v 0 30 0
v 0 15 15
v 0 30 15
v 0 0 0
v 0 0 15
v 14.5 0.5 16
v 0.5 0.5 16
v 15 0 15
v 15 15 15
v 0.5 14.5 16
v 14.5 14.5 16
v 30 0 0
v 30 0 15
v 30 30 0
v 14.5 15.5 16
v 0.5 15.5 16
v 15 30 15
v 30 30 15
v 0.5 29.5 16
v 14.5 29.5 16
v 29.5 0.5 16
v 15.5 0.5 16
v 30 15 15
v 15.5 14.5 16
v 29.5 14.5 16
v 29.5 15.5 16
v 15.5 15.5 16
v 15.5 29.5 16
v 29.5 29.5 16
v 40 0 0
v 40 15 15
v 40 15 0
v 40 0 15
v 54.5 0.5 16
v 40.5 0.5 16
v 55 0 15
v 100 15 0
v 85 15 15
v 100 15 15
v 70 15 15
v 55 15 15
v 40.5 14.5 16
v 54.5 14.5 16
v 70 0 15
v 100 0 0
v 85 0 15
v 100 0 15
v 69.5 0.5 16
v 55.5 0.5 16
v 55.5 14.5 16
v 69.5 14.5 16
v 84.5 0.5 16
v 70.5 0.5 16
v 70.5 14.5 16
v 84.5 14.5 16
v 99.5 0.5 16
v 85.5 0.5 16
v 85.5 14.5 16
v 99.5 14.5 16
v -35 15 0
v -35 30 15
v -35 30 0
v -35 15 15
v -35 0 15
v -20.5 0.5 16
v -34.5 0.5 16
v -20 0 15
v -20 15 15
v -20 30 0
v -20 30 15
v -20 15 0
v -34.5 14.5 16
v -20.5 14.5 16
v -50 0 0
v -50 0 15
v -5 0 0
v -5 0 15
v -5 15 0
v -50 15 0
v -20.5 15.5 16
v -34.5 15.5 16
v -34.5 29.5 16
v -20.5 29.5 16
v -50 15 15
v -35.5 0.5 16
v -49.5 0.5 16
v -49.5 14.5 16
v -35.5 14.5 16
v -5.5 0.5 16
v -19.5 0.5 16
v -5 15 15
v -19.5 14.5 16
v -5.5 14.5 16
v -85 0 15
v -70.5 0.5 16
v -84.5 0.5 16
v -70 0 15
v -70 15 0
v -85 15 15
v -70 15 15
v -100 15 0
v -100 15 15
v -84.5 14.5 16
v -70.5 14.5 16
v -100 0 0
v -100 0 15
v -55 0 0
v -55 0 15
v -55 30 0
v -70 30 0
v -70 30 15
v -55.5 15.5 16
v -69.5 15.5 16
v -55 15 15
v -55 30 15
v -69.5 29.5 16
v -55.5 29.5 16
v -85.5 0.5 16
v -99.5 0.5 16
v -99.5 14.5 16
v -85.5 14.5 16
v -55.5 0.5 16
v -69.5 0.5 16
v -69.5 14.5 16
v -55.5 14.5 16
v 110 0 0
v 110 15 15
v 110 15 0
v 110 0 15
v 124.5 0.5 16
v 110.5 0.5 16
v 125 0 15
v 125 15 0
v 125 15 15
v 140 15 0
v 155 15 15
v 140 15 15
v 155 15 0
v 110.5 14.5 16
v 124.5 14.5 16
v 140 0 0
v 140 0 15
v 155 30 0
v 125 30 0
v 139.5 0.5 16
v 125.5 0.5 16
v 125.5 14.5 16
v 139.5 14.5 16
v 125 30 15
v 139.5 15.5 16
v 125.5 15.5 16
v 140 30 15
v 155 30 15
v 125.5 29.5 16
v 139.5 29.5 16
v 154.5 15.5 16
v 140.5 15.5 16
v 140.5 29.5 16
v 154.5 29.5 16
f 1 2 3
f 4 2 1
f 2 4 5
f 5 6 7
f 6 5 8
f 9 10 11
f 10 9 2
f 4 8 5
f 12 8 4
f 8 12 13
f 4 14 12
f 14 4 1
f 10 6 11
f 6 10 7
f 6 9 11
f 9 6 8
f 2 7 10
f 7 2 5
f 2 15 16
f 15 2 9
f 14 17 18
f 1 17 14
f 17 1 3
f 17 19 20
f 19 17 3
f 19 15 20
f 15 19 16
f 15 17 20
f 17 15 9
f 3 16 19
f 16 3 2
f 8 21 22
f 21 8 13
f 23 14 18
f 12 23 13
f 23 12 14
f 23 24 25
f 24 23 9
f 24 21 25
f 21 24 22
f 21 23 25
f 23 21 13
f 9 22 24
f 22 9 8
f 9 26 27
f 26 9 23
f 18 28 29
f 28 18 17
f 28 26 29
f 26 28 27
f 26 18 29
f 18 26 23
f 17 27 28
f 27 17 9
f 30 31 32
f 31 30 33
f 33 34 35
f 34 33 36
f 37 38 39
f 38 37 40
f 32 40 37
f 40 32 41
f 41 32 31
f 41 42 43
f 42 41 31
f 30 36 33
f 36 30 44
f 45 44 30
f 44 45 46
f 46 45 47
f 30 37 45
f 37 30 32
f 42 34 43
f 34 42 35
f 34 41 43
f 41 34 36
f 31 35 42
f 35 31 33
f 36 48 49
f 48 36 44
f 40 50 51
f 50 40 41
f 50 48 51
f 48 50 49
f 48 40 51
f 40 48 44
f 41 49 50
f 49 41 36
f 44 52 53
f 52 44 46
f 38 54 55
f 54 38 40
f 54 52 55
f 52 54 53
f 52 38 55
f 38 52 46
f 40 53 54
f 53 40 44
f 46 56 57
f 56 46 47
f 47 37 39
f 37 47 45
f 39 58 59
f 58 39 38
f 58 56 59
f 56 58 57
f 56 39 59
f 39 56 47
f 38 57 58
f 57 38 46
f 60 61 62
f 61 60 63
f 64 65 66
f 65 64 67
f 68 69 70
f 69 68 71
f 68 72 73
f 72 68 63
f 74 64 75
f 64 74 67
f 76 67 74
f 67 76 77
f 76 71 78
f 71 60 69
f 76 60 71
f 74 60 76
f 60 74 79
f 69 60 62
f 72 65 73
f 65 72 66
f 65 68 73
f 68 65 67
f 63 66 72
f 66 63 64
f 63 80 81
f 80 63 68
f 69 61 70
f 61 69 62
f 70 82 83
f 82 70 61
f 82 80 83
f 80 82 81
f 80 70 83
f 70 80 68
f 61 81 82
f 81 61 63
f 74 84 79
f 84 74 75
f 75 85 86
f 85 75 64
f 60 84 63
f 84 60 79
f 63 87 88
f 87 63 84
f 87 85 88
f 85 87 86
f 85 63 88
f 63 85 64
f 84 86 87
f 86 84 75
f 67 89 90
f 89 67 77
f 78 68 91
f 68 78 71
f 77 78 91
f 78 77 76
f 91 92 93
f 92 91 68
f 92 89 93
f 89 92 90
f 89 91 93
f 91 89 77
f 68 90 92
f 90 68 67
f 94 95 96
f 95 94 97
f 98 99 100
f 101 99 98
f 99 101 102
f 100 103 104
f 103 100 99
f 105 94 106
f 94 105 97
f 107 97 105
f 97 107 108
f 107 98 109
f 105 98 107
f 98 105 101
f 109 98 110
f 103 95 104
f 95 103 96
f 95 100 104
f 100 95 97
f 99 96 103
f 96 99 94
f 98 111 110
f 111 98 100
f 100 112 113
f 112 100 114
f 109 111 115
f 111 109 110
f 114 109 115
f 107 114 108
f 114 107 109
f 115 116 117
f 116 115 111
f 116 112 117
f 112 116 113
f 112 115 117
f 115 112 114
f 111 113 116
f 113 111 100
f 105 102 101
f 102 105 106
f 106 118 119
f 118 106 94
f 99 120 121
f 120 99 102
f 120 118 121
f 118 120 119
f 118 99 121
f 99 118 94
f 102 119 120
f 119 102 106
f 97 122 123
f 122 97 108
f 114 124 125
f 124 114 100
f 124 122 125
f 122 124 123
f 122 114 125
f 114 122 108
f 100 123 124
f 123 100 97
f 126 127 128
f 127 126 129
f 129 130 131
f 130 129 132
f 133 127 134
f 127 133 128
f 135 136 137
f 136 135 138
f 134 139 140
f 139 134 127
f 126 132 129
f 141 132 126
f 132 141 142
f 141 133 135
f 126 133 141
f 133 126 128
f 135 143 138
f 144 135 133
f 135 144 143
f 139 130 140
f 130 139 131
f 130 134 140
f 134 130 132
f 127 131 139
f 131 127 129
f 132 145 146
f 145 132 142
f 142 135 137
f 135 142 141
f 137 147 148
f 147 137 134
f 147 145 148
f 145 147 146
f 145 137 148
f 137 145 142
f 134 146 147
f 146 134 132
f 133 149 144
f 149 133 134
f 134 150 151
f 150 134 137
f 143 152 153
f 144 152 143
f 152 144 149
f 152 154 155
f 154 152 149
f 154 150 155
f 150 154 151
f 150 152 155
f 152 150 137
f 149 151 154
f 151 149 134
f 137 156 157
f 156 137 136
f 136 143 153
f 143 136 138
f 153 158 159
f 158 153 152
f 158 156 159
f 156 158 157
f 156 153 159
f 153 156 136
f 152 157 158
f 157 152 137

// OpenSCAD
module pieza_cubo(x,y,z,colores){
	c1_x=x;
	c1_y=y;
	c1_z=z;
	c2_x=c1_x-1;
	c2_y=c1_y+0.5;
	c2_z=c1_z-1;
	color(colores)
	hull(){
		cube([c1_x,c1_y,c1_z]);
		translate([((c1_x-c2_x)-0.5),((c1_y-c2_y)-0.5),((c1_z-c2_z))-0.5])
		cube([c2_x,c2_y,c2_z]);
	}
	
}

module cubo_tetris(ancho,fondo,alto,colores){
	union(){
		for(c=[0:1]){
			for(f=[0:1]){
					translate([c*ancho,0,f*ancho])
						pieza_cubo(ancho,fondo,alto,colores);
			}
		}
	}
}

module barra_tetris(ancho,fondo,alto,colores){
	union(){	
		for(c=[0:3]){
				translate([c*ancho,0,0])
						pieza_cubo(ancho,fondo,alto,colores);
		}
	}
}

module t_tetris(ancho,fondo,alto,colores){
	union(){
		for(c=[0:2]){	
			for(f=[0:1]){
				if(c%2!=0){
					translate([c*ancho,0,f*ancho])
						pieza_cubo(ancho,fondo,alto,colores);
				}else if(f%2==0){
					translate([c*ancho,0,f*ancho])
						pieza_cubo(ancho,fondo,alto,colores);
				}
			}
		}
	}
}

module l_tetris(ancho,fondo,alto,colores){
	union(){
			for(c=[0:2]){	
					for(f=[0:1]){
						if(c%2!=0){
							if(f==1){
								translate([c*ancho*2,0,f*ancho])
									pieza_cubo(ancho,fondo,alto,colores);
							}else{
								translate([c*ancho,0,f*ancho])
									pieza_cubo(ancho,fondo,alto,colores);
							}					
						}else if(f%2==0){
							translate([c*ancho,0,f*ancho])
							pieza_cubo(ancho,fondo,alto,colores);
						}
					}
				}
		}
}

module z_tetris(ancho,fondo,alto,colores){
	union(){
			for(c=[0:1]){
				for(f=[0:0]){				
					translate([c*ancho,0,f*ancho])
						pieza_cubo(ancho,fondo,alto,colores);			
				}
			}
			translate([ancho,0,ancho])
			for(c=[0:1]){
				for(f=[0:0]){				
					translate([c*ancho,0,f*ancho])
						pieza_cubo(ancho,fondo,alto,colores);			
				}
			}
	}
}



translate([0,0,15])
rotate([-90,0,0]){
	cubo_tetris(15,15,15,"yellow");
	translate([40,0,0])
		barra_tetris(15,15,15,"red");
	translate([-50,0,0])
		t_tetris(15,15,15,"green");
	translate([-100,0,0])
		l_tetris(15,15,15,"purple"); 
	translate([110,0,0])
		z_tetris(15,15,15,"blue");
}
